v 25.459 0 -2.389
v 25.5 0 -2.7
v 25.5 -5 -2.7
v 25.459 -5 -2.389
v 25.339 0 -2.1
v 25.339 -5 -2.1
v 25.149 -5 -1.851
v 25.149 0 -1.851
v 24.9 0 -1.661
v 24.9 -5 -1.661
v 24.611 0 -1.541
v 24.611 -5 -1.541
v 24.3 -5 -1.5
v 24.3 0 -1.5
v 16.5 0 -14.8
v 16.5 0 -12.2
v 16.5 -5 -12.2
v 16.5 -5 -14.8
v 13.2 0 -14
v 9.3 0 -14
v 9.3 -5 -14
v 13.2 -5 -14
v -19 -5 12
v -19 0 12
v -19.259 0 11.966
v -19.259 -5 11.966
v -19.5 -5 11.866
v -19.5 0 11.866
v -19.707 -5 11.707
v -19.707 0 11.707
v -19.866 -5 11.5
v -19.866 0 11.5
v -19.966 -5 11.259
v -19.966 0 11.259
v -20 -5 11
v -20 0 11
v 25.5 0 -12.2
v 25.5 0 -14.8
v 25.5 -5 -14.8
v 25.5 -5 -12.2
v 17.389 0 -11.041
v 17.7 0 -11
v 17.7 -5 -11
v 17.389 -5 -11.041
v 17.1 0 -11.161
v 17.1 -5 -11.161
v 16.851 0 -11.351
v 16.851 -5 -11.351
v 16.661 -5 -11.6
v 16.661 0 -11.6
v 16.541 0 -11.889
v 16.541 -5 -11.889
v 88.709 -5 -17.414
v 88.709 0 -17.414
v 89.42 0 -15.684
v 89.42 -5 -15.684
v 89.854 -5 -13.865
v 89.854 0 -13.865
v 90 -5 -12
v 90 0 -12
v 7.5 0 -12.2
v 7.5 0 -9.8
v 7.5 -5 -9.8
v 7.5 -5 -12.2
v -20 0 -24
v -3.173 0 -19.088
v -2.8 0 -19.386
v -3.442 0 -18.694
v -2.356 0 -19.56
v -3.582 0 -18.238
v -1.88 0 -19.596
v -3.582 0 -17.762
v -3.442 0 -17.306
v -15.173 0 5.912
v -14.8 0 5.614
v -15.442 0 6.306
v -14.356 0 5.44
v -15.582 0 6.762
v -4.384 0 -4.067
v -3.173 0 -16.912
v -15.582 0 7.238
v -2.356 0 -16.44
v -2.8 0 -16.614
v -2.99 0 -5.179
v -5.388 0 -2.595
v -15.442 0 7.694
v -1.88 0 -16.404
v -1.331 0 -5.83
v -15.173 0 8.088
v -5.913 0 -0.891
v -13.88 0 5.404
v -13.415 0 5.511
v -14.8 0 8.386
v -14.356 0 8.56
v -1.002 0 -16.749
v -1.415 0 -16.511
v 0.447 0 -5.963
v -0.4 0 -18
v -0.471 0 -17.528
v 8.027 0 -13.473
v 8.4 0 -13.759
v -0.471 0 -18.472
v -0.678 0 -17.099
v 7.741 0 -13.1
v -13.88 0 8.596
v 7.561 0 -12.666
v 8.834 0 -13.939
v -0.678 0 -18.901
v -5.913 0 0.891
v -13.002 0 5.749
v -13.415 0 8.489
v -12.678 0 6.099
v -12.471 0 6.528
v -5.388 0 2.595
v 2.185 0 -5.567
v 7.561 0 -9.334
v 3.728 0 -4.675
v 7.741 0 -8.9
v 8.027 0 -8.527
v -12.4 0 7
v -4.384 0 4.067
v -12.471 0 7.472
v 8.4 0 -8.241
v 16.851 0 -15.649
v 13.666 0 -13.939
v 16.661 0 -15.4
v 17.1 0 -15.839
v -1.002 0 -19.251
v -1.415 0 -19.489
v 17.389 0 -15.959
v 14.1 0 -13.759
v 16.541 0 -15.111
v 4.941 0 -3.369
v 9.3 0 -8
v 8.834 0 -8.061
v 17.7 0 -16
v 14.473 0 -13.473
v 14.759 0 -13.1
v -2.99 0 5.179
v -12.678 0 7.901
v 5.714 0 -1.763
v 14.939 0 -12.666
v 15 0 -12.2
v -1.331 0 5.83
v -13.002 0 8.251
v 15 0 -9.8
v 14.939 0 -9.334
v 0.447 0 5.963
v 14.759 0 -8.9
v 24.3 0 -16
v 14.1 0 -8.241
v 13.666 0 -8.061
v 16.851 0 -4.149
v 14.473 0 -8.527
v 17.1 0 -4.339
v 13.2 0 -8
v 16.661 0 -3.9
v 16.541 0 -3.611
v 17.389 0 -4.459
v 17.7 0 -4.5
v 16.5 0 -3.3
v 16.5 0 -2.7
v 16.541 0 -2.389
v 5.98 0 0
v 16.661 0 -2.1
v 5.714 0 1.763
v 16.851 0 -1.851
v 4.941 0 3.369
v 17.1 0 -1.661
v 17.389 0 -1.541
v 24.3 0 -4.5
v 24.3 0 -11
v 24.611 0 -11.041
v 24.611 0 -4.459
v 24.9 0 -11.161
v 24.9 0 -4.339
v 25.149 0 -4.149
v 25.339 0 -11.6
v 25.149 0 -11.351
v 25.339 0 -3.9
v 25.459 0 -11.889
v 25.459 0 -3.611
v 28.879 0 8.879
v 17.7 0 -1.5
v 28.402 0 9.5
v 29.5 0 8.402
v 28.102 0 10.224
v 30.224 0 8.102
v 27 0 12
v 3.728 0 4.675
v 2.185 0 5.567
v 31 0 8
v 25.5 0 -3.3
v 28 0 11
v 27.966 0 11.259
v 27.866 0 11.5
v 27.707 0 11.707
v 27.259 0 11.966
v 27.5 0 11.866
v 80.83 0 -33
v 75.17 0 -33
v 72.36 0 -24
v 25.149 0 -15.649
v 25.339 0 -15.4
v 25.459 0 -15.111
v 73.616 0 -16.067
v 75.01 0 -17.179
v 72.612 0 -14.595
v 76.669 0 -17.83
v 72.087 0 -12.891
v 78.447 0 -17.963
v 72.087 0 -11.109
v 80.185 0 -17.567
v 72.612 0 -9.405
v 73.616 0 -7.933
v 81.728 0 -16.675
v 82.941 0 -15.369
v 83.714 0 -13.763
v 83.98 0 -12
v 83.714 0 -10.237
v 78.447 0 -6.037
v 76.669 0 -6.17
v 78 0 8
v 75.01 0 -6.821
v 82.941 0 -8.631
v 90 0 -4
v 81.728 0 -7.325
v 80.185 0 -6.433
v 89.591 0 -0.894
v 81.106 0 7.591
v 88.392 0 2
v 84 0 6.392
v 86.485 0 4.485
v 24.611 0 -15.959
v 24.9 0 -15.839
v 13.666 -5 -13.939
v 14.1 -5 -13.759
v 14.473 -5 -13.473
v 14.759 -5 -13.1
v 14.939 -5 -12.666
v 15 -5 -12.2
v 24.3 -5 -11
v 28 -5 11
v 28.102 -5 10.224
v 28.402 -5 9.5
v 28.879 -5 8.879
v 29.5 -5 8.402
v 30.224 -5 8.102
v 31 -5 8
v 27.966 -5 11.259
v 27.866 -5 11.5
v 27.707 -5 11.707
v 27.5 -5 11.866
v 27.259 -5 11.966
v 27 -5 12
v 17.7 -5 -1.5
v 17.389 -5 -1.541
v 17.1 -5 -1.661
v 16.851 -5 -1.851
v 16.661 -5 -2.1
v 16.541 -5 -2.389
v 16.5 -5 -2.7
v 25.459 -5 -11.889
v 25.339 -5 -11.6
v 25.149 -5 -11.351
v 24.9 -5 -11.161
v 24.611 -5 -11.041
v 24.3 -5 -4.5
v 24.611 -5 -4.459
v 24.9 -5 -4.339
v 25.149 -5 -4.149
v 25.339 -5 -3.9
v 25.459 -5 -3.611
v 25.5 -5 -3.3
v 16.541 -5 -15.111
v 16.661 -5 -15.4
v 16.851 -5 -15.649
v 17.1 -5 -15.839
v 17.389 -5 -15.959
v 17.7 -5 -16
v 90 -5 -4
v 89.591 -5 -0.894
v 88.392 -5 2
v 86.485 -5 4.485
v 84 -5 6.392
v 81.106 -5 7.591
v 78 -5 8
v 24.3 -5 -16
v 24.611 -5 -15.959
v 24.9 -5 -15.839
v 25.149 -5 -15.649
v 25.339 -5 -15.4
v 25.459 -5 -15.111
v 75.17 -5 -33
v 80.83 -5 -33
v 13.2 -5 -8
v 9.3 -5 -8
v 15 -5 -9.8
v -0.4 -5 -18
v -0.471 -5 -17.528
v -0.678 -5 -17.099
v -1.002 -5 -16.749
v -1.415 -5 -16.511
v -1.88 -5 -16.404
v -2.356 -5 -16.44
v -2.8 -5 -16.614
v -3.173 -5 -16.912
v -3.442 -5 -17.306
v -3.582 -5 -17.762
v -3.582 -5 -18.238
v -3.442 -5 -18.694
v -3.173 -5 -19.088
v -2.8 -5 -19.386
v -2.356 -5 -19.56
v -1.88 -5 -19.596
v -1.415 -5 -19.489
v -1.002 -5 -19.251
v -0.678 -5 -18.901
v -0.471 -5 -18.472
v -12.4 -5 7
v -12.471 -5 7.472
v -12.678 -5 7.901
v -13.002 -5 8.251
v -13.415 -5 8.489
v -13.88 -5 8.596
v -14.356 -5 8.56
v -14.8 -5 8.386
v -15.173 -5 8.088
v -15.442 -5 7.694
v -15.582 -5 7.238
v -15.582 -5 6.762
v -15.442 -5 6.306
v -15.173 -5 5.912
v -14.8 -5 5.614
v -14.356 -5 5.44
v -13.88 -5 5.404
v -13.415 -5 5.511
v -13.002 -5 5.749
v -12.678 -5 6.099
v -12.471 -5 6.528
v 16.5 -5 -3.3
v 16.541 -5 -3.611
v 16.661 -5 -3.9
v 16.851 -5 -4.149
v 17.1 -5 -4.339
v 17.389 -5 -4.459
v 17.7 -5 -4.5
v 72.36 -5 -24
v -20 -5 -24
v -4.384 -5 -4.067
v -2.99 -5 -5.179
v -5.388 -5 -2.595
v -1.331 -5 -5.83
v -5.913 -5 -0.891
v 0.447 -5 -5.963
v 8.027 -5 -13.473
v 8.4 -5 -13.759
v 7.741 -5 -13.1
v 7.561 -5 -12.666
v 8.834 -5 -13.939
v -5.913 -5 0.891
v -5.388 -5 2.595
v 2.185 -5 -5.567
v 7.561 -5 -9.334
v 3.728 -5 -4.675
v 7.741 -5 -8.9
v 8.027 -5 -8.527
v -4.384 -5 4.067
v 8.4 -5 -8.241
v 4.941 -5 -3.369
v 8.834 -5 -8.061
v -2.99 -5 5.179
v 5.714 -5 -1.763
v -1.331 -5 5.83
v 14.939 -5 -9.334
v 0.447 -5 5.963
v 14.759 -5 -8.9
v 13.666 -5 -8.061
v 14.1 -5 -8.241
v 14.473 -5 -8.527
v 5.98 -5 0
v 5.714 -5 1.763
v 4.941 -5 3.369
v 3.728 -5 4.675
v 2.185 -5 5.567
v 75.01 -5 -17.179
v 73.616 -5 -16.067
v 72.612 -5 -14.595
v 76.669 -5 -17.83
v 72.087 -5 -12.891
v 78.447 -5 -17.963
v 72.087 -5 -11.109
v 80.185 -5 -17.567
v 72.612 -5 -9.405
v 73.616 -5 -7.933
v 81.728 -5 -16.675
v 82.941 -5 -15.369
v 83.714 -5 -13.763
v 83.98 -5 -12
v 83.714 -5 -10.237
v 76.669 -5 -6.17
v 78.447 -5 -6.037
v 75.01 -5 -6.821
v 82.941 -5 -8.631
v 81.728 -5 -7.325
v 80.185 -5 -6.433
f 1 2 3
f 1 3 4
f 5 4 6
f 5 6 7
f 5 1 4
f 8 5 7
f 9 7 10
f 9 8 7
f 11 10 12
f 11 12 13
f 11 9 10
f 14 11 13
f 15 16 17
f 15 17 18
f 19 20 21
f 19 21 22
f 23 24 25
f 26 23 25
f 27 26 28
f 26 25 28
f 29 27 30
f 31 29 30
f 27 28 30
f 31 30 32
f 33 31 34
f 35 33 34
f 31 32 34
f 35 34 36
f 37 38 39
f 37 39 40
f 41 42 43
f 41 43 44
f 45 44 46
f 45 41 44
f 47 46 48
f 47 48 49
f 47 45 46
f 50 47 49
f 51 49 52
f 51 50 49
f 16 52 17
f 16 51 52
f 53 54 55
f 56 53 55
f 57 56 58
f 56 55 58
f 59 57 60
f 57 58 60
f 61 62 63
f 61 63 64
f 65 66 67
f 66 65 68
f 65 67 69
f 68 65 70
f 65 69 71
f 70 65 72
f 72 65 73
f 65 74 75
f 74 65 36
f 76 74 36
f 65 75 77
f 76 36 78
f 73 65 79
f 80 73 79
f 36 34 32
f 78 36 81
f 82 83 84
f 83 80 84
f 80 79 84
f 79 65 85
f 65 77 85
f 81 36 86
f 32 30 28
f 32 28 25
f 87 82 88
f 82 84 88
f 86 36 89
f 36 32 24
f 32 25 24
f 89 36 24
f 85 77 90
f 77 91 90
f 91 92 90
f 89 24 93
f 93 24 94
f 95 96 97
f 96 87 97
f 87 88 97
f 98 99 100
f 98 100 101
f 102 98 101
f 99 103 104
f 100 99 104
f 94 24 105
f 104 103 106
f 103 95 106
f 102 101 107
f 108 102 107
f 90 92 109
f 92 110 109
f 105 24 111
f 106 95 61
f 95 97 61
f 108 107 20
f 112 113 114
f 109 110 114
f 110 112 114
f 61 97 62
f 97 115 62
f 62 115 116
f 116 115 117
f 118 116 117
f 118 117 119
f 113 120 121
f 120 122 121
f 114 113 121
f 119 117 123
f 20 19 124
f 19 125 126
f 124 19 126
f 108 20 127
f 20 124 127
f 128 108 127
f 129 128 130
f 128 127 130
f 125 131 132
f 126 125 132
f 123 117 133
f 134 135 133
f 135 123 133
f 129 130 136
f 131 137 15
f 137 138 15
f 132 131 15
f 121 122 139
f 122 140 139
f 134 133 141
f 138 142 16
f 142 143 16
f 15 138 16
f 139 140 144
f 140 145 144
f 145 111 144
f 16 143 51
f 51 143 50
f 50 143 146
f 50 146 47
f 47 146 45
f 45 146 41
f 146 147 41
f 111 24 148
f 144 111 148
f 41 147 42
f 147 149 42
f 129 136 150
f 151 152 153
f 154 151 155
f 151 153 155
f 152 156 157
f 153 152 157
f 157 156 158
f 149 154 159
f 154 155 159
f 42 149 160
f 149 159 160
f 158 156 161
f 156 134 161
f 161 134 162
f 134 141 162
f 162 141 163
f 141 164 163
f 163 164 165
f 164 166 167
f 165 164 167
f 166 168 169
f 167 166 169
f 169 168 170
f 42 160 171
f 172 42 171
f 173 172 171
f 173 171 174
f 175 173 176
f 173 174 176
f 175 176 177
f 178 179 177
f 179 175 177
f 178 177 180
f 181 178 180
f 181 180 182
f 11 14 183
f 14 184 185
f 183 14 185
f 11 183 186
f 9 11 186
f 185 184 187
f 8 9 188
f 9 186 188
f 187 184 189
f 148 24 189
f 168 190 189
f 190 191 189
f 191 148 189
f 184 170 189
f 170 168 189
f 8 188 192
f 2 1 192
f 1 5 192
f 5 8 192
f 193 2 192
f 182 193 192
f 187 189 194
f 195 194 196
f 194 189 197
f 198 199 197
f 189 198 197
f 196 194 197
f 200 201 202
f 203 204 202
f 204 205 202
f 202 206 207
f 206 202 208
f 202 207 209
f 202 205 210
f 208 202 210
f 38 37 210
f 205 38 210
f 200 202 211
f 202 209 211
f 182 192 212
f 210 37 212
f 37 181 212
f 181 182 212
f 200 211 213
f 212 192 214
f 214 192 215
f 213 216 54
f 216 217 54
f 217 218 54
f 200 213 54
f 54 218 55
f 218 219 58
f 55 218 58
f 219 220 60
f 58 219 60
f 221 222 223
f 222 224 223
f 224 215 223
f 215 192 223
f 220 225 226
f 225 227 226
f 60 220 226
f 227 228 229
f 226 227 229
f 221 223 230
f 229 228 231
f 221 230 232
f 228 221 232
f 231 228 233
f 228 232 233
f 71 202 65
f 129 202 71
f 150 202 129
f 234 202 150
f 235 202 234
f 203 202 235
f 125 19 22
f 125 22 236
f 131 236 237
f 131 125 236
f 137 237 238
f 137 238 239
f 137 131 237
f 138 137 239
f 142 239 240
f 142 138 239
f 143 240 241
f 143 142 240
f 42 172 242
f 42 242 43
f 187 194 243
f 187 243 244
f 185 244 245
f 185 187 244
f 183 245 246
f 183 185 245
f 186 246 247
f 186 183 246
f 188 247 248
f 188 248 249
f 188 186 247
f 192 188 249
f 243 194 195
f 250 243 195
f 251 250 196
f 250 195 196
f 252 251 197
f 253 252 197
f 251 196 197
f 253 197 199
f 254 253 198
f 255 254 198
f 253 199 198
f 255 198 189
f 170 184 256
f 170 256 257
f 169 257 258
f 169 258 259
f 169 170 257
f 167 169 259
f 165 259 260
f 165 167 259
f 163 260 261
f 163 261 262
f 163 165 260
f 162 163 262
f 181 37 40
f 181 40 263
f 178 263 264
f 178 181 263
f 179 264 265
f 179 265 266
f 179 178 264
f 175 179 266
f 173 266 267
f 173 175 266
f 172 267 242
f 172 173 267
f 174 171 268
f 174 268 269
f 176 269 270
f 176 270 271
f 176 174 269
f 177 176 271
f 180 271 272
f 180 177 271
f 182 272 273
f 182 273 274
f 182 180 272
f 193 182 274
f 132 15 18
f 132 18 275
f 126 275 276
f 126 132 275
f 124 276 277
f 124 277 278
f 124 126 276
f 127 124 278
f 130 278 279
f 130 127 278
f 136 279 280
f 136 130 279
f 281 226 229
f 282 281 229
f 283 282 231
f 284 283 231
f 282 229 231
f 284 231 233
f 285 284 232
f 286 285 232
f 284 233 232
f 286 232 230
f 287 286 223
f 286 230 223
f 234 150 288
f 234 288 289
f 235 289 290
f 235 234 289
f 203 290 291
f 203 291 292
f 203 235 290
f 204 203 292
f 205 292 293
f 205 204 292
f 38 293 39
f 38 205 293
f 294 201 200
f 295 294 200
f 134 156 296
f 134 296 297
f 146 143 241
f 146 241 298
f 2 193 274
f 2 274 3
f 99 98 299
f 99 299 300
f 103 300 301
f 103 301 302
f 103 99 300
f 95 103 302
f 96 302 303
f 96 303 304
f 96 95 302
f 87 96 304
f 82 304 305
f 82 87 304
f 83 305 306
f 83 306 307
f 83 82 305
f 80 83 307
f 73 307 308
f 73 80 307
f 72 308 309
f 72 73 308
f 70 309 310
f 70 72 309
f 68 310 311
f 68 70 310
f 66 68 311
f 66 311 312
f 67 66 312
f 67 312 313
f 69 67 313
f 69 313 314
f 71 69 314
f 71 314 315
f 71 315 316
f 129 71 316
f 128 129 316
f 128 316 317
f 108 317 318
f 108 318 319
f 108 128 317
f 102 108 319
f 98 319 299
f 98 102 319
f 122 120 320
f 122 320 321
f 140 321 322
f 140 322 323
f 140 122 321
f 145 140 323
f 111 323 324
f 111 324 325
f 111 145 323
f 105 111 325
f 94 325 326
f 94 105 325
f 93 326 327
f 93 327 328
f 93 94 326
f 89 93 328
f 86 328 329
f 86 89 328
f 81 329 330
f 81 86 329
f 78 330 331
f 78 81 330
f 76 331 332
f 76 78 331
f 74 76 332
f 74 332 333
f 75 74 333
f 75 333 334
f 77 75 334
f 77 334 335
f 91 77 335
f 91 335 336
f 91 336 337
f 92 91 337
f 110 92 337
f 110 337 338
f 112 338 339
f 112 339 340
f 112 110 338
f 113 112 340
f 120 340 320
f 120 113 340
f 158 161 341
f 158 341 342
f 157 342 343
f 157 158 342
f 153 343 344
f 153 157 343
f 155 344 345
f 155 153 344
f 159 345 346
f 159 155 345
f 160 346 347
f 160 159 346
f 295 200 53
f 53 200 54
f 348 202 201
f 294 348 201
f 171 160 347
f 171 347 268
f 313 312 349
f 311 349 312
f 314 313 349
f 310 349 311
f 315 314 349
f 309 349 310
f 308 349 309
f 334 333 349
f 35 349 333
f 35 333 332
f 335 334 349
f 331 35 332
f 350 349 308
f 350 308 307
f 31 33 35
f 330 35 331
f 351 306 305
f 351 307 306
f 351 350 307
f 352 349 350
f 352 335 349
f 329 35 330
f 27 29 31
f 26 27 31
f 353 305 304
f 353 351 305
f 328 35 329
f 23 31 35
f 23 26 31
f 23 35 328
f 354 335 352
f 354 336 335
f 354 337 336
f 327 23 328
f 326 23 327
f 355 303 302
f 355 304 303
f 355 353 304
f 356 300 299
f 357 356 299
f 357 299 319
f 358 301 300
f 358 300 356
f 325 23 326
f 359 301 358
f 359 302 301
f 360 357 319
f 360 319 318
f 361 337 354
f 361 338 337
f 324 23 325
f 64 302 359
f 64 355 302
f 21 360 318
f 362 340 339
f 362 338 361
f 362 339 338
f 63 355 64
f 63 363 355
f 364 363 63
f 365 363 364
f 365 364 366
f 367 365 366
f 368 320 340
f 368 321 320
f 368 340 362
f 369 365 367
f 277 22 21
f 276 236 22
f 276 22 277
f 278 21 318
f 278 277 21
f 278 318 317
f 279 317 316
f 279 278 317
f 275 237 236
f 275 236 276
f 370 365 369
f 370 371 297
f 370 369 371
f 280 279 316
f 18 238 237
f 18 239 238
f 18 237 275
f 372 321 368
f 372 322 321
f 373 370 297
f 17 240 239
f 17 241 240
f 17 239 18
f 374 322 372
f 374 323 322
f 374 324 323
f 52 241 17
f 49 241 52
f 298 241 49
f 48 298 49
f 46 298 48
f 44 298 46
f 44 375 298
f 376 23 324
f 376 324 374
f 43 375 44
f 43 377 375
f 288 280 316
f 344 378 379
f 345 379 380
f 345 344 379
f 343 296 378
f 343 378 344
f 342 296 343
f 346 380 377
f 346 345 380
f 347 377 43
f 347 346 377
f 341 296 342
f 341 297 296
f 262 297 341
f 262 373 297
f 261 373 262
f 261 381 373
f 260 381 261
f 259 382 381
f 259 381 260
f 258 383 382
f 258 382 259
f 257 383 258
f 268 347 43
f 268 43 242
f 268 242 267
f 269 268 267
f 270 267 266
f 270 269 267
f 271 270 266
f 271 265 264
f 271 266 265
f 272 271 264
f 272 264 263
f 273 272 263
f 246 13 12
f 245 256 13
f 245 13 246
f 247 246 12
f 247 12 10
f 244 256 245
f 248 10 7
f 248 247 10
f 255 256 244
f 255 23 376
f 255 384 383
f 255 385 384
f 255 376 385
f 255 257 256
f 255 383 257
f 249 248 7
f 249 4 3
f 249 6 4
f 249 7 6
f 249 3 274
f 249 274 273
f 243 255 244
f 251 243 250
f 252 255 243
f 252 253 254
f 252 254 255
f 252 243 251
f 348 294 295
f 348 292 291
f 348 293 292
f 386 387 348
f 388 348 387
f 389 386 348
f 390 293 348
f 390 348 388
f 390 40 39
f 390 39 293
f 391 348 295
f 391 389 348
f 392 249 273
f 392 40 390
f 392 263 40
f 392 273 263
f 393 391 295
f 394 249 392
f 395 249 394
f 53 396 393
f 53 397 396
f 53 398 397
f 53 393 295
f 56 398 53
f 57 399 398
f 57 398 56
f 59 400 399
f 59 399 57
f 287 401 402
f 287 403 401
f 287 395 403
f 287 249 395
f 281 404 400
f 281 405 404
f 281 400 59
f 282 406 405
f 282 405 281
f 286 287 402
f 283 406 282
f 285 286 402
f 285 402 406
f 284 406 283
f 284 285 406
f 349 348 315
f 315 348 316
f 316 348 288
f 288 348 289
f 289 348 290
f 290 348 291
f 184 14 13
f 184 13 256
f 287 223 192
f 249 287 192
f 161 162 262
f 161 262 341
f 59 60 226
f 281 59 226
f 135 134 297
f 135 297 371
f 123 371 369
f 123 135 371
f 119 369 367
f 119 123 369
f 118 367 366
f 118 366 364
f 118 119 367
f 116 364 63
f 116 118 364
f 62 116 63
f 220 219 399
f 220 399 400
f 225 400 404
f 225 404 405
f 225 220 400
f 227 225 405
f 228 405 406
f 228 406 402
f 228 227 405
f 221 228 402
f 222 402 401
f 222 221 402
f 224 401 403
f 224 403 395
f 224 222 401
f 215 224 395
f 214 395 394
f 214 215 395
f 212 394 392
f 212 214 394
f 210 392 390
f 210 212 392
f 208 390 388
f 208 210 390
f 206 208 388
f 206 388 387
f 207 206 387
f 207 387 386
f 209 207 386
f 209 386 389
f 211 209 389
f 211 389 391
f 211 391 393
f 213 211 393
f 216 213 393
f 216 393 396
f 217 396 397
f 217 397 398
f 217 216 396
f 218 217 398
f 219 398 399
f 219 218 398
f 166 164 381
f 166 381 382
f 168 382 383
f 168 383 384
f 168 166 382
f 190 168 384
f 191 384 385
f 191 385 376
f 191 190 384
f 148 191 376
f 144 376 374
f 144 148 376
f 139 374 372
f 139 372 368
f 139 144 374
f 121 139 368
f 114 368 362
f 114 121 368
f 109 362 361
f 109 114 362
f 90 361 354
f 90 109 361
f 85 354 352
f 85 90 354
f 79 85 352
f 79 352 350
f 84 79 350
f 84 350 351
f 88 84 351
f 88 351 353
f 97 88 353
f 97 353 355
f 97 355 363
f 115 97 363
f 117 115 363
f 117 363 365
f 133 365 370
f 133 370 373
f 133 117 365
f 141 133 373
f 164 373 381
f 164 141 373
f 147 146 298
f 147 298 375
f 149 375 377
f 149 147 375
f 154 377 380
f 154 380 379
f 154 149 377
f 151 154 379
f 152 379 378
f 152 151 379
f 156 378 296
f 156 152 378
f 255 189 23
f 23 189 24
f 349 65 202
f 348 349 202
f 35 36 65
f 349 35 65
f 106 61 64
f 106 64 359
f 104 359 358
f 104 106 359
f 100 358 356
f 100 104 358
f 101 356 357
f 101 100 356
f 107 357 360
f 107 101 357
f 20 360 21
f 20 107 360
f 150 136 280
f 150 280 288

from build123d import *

# Parameters (mm, degrees)
SKETCH041_R   = 1.6
SKETCH041_R_2 = 5.98
PAD_DEPTH     = 5


with BuildPart() as part:
    # Sketch041 → Pad (new body)
    with BuildSketch(Plane.XZ):
        with BuildLine():
            Line((75.17, -33), (80.83, -33))
            Line((80.83, -33), (88.709309, -17.413936))
            ThreePointArc((88.709309, -17.413936), (89.672868, -14.782831), (90, -12))
            Line((90, -12), (90, -4))
            ThreePointArc((90, -4), (86.485281, 4.485281), (78, 8))
            Line((78, 8), (31, 8))
            ThreePointArc((28, 11), (28.87868, 8.87868), (31, 8))
            ThreePointArc((28, 11), (27.707107, 11.707107), (27, 12))
            Line((27, 12), (-19, 12))
            ThreePointArc((-19, 12), (-19.707107, 11.707107), (-20, 11))
            Line((-20, 11), (-20, -24))
            Line((-20, -24), (72.36, -24))
            Line((72.36, -24), (75.17, -33))
        make_face()
        with Locations((-14, 7)):
            Circle(SKETCH041_R, mode=Mode.SUBTRACT)
        with Locations((-2, -18)):
            Circle(SKETCH041_R, mode=Mode.SUBTRACT)
        Circle(SKETCH041_R_2, mode=Mode.SUBTRACT)
        with Locations((78, -12)):
            Circle(SKETCH041_R_2, mode=Mode.SUBTRACT)
        with BuildLine():
            ThreePointArc((7.5, -12.2), (8.027208, -13.472792), (9.3, -14))
            Line((9.3, -14), (13.2, -14))
            ThreePointArc((13.2, -14), (14.472792, -13.472792), (15, -12.2))
            Line((15, -12.2), (15, -9.8))
            ThreePointArc((15, -9.8), (14.472792, -8.527208), (13.2, -8))
            Line((13.2, -8), (9.3, -8))
            ThreePointArc((9.3, -8), (8.027208, -8.527208), (7.5, -9.8))
            Line((7.5, -9.8), (7.5, -12.2))
        make_face(mode=Mode.SUBTRACT)
        with BuildLine():
            Line((17.7, -4.5), (24.3, -4.5))
            ThreePointArc((24.3, -4.5), (25.148528, -4.148528), (25.5, -3.3))
            Line((25.5, -3.3), (25.5, -2.7))
            ThreePointArc((25.5, -2.7), (25.148528, -1.851472), (24.3, -1.5))
            Line((24.3, -1.5), (17.7, -1.5))
            ThreePointArc((17.7, -1.5), (16.851472, -1.851472), (16.5, -2.7))
            Line((16.5, -2.7), (16.5, -3.3))
            ThreePointArc((16.5, -3.3), (16.851472, -4.148528), (17.7, -4.5))
        make_face(mode=Mode.SUBTRACT)
        with BuildLine():
            Line((17.7, -16), (24.3, -16))
            ThreePointArc((24.3, -16), (25.148528, -15.648528), (25.5, -14.8))
            Line((25.5, -14.8), (25.5, -12.2))
            ThreePointArc((25.5, -12.2), (25.148528, -11.351472), (24.3, -11))
            Line((24.3, -11), (17.7, -11))
            ThreePointArc((17.7, -11), (16.851472, -11.351472), (16.5, -12.2))
            Line((16.5, -12.2), (16.5, -14.8))
            ThreePointArc((16.5, -14.8), (16.851472, -15.648528), (17.7, -16))
        make_face(mode=Mode.SUBTRACT)
    extrude(amount=PAD_DEPTH)


solid = part.part
